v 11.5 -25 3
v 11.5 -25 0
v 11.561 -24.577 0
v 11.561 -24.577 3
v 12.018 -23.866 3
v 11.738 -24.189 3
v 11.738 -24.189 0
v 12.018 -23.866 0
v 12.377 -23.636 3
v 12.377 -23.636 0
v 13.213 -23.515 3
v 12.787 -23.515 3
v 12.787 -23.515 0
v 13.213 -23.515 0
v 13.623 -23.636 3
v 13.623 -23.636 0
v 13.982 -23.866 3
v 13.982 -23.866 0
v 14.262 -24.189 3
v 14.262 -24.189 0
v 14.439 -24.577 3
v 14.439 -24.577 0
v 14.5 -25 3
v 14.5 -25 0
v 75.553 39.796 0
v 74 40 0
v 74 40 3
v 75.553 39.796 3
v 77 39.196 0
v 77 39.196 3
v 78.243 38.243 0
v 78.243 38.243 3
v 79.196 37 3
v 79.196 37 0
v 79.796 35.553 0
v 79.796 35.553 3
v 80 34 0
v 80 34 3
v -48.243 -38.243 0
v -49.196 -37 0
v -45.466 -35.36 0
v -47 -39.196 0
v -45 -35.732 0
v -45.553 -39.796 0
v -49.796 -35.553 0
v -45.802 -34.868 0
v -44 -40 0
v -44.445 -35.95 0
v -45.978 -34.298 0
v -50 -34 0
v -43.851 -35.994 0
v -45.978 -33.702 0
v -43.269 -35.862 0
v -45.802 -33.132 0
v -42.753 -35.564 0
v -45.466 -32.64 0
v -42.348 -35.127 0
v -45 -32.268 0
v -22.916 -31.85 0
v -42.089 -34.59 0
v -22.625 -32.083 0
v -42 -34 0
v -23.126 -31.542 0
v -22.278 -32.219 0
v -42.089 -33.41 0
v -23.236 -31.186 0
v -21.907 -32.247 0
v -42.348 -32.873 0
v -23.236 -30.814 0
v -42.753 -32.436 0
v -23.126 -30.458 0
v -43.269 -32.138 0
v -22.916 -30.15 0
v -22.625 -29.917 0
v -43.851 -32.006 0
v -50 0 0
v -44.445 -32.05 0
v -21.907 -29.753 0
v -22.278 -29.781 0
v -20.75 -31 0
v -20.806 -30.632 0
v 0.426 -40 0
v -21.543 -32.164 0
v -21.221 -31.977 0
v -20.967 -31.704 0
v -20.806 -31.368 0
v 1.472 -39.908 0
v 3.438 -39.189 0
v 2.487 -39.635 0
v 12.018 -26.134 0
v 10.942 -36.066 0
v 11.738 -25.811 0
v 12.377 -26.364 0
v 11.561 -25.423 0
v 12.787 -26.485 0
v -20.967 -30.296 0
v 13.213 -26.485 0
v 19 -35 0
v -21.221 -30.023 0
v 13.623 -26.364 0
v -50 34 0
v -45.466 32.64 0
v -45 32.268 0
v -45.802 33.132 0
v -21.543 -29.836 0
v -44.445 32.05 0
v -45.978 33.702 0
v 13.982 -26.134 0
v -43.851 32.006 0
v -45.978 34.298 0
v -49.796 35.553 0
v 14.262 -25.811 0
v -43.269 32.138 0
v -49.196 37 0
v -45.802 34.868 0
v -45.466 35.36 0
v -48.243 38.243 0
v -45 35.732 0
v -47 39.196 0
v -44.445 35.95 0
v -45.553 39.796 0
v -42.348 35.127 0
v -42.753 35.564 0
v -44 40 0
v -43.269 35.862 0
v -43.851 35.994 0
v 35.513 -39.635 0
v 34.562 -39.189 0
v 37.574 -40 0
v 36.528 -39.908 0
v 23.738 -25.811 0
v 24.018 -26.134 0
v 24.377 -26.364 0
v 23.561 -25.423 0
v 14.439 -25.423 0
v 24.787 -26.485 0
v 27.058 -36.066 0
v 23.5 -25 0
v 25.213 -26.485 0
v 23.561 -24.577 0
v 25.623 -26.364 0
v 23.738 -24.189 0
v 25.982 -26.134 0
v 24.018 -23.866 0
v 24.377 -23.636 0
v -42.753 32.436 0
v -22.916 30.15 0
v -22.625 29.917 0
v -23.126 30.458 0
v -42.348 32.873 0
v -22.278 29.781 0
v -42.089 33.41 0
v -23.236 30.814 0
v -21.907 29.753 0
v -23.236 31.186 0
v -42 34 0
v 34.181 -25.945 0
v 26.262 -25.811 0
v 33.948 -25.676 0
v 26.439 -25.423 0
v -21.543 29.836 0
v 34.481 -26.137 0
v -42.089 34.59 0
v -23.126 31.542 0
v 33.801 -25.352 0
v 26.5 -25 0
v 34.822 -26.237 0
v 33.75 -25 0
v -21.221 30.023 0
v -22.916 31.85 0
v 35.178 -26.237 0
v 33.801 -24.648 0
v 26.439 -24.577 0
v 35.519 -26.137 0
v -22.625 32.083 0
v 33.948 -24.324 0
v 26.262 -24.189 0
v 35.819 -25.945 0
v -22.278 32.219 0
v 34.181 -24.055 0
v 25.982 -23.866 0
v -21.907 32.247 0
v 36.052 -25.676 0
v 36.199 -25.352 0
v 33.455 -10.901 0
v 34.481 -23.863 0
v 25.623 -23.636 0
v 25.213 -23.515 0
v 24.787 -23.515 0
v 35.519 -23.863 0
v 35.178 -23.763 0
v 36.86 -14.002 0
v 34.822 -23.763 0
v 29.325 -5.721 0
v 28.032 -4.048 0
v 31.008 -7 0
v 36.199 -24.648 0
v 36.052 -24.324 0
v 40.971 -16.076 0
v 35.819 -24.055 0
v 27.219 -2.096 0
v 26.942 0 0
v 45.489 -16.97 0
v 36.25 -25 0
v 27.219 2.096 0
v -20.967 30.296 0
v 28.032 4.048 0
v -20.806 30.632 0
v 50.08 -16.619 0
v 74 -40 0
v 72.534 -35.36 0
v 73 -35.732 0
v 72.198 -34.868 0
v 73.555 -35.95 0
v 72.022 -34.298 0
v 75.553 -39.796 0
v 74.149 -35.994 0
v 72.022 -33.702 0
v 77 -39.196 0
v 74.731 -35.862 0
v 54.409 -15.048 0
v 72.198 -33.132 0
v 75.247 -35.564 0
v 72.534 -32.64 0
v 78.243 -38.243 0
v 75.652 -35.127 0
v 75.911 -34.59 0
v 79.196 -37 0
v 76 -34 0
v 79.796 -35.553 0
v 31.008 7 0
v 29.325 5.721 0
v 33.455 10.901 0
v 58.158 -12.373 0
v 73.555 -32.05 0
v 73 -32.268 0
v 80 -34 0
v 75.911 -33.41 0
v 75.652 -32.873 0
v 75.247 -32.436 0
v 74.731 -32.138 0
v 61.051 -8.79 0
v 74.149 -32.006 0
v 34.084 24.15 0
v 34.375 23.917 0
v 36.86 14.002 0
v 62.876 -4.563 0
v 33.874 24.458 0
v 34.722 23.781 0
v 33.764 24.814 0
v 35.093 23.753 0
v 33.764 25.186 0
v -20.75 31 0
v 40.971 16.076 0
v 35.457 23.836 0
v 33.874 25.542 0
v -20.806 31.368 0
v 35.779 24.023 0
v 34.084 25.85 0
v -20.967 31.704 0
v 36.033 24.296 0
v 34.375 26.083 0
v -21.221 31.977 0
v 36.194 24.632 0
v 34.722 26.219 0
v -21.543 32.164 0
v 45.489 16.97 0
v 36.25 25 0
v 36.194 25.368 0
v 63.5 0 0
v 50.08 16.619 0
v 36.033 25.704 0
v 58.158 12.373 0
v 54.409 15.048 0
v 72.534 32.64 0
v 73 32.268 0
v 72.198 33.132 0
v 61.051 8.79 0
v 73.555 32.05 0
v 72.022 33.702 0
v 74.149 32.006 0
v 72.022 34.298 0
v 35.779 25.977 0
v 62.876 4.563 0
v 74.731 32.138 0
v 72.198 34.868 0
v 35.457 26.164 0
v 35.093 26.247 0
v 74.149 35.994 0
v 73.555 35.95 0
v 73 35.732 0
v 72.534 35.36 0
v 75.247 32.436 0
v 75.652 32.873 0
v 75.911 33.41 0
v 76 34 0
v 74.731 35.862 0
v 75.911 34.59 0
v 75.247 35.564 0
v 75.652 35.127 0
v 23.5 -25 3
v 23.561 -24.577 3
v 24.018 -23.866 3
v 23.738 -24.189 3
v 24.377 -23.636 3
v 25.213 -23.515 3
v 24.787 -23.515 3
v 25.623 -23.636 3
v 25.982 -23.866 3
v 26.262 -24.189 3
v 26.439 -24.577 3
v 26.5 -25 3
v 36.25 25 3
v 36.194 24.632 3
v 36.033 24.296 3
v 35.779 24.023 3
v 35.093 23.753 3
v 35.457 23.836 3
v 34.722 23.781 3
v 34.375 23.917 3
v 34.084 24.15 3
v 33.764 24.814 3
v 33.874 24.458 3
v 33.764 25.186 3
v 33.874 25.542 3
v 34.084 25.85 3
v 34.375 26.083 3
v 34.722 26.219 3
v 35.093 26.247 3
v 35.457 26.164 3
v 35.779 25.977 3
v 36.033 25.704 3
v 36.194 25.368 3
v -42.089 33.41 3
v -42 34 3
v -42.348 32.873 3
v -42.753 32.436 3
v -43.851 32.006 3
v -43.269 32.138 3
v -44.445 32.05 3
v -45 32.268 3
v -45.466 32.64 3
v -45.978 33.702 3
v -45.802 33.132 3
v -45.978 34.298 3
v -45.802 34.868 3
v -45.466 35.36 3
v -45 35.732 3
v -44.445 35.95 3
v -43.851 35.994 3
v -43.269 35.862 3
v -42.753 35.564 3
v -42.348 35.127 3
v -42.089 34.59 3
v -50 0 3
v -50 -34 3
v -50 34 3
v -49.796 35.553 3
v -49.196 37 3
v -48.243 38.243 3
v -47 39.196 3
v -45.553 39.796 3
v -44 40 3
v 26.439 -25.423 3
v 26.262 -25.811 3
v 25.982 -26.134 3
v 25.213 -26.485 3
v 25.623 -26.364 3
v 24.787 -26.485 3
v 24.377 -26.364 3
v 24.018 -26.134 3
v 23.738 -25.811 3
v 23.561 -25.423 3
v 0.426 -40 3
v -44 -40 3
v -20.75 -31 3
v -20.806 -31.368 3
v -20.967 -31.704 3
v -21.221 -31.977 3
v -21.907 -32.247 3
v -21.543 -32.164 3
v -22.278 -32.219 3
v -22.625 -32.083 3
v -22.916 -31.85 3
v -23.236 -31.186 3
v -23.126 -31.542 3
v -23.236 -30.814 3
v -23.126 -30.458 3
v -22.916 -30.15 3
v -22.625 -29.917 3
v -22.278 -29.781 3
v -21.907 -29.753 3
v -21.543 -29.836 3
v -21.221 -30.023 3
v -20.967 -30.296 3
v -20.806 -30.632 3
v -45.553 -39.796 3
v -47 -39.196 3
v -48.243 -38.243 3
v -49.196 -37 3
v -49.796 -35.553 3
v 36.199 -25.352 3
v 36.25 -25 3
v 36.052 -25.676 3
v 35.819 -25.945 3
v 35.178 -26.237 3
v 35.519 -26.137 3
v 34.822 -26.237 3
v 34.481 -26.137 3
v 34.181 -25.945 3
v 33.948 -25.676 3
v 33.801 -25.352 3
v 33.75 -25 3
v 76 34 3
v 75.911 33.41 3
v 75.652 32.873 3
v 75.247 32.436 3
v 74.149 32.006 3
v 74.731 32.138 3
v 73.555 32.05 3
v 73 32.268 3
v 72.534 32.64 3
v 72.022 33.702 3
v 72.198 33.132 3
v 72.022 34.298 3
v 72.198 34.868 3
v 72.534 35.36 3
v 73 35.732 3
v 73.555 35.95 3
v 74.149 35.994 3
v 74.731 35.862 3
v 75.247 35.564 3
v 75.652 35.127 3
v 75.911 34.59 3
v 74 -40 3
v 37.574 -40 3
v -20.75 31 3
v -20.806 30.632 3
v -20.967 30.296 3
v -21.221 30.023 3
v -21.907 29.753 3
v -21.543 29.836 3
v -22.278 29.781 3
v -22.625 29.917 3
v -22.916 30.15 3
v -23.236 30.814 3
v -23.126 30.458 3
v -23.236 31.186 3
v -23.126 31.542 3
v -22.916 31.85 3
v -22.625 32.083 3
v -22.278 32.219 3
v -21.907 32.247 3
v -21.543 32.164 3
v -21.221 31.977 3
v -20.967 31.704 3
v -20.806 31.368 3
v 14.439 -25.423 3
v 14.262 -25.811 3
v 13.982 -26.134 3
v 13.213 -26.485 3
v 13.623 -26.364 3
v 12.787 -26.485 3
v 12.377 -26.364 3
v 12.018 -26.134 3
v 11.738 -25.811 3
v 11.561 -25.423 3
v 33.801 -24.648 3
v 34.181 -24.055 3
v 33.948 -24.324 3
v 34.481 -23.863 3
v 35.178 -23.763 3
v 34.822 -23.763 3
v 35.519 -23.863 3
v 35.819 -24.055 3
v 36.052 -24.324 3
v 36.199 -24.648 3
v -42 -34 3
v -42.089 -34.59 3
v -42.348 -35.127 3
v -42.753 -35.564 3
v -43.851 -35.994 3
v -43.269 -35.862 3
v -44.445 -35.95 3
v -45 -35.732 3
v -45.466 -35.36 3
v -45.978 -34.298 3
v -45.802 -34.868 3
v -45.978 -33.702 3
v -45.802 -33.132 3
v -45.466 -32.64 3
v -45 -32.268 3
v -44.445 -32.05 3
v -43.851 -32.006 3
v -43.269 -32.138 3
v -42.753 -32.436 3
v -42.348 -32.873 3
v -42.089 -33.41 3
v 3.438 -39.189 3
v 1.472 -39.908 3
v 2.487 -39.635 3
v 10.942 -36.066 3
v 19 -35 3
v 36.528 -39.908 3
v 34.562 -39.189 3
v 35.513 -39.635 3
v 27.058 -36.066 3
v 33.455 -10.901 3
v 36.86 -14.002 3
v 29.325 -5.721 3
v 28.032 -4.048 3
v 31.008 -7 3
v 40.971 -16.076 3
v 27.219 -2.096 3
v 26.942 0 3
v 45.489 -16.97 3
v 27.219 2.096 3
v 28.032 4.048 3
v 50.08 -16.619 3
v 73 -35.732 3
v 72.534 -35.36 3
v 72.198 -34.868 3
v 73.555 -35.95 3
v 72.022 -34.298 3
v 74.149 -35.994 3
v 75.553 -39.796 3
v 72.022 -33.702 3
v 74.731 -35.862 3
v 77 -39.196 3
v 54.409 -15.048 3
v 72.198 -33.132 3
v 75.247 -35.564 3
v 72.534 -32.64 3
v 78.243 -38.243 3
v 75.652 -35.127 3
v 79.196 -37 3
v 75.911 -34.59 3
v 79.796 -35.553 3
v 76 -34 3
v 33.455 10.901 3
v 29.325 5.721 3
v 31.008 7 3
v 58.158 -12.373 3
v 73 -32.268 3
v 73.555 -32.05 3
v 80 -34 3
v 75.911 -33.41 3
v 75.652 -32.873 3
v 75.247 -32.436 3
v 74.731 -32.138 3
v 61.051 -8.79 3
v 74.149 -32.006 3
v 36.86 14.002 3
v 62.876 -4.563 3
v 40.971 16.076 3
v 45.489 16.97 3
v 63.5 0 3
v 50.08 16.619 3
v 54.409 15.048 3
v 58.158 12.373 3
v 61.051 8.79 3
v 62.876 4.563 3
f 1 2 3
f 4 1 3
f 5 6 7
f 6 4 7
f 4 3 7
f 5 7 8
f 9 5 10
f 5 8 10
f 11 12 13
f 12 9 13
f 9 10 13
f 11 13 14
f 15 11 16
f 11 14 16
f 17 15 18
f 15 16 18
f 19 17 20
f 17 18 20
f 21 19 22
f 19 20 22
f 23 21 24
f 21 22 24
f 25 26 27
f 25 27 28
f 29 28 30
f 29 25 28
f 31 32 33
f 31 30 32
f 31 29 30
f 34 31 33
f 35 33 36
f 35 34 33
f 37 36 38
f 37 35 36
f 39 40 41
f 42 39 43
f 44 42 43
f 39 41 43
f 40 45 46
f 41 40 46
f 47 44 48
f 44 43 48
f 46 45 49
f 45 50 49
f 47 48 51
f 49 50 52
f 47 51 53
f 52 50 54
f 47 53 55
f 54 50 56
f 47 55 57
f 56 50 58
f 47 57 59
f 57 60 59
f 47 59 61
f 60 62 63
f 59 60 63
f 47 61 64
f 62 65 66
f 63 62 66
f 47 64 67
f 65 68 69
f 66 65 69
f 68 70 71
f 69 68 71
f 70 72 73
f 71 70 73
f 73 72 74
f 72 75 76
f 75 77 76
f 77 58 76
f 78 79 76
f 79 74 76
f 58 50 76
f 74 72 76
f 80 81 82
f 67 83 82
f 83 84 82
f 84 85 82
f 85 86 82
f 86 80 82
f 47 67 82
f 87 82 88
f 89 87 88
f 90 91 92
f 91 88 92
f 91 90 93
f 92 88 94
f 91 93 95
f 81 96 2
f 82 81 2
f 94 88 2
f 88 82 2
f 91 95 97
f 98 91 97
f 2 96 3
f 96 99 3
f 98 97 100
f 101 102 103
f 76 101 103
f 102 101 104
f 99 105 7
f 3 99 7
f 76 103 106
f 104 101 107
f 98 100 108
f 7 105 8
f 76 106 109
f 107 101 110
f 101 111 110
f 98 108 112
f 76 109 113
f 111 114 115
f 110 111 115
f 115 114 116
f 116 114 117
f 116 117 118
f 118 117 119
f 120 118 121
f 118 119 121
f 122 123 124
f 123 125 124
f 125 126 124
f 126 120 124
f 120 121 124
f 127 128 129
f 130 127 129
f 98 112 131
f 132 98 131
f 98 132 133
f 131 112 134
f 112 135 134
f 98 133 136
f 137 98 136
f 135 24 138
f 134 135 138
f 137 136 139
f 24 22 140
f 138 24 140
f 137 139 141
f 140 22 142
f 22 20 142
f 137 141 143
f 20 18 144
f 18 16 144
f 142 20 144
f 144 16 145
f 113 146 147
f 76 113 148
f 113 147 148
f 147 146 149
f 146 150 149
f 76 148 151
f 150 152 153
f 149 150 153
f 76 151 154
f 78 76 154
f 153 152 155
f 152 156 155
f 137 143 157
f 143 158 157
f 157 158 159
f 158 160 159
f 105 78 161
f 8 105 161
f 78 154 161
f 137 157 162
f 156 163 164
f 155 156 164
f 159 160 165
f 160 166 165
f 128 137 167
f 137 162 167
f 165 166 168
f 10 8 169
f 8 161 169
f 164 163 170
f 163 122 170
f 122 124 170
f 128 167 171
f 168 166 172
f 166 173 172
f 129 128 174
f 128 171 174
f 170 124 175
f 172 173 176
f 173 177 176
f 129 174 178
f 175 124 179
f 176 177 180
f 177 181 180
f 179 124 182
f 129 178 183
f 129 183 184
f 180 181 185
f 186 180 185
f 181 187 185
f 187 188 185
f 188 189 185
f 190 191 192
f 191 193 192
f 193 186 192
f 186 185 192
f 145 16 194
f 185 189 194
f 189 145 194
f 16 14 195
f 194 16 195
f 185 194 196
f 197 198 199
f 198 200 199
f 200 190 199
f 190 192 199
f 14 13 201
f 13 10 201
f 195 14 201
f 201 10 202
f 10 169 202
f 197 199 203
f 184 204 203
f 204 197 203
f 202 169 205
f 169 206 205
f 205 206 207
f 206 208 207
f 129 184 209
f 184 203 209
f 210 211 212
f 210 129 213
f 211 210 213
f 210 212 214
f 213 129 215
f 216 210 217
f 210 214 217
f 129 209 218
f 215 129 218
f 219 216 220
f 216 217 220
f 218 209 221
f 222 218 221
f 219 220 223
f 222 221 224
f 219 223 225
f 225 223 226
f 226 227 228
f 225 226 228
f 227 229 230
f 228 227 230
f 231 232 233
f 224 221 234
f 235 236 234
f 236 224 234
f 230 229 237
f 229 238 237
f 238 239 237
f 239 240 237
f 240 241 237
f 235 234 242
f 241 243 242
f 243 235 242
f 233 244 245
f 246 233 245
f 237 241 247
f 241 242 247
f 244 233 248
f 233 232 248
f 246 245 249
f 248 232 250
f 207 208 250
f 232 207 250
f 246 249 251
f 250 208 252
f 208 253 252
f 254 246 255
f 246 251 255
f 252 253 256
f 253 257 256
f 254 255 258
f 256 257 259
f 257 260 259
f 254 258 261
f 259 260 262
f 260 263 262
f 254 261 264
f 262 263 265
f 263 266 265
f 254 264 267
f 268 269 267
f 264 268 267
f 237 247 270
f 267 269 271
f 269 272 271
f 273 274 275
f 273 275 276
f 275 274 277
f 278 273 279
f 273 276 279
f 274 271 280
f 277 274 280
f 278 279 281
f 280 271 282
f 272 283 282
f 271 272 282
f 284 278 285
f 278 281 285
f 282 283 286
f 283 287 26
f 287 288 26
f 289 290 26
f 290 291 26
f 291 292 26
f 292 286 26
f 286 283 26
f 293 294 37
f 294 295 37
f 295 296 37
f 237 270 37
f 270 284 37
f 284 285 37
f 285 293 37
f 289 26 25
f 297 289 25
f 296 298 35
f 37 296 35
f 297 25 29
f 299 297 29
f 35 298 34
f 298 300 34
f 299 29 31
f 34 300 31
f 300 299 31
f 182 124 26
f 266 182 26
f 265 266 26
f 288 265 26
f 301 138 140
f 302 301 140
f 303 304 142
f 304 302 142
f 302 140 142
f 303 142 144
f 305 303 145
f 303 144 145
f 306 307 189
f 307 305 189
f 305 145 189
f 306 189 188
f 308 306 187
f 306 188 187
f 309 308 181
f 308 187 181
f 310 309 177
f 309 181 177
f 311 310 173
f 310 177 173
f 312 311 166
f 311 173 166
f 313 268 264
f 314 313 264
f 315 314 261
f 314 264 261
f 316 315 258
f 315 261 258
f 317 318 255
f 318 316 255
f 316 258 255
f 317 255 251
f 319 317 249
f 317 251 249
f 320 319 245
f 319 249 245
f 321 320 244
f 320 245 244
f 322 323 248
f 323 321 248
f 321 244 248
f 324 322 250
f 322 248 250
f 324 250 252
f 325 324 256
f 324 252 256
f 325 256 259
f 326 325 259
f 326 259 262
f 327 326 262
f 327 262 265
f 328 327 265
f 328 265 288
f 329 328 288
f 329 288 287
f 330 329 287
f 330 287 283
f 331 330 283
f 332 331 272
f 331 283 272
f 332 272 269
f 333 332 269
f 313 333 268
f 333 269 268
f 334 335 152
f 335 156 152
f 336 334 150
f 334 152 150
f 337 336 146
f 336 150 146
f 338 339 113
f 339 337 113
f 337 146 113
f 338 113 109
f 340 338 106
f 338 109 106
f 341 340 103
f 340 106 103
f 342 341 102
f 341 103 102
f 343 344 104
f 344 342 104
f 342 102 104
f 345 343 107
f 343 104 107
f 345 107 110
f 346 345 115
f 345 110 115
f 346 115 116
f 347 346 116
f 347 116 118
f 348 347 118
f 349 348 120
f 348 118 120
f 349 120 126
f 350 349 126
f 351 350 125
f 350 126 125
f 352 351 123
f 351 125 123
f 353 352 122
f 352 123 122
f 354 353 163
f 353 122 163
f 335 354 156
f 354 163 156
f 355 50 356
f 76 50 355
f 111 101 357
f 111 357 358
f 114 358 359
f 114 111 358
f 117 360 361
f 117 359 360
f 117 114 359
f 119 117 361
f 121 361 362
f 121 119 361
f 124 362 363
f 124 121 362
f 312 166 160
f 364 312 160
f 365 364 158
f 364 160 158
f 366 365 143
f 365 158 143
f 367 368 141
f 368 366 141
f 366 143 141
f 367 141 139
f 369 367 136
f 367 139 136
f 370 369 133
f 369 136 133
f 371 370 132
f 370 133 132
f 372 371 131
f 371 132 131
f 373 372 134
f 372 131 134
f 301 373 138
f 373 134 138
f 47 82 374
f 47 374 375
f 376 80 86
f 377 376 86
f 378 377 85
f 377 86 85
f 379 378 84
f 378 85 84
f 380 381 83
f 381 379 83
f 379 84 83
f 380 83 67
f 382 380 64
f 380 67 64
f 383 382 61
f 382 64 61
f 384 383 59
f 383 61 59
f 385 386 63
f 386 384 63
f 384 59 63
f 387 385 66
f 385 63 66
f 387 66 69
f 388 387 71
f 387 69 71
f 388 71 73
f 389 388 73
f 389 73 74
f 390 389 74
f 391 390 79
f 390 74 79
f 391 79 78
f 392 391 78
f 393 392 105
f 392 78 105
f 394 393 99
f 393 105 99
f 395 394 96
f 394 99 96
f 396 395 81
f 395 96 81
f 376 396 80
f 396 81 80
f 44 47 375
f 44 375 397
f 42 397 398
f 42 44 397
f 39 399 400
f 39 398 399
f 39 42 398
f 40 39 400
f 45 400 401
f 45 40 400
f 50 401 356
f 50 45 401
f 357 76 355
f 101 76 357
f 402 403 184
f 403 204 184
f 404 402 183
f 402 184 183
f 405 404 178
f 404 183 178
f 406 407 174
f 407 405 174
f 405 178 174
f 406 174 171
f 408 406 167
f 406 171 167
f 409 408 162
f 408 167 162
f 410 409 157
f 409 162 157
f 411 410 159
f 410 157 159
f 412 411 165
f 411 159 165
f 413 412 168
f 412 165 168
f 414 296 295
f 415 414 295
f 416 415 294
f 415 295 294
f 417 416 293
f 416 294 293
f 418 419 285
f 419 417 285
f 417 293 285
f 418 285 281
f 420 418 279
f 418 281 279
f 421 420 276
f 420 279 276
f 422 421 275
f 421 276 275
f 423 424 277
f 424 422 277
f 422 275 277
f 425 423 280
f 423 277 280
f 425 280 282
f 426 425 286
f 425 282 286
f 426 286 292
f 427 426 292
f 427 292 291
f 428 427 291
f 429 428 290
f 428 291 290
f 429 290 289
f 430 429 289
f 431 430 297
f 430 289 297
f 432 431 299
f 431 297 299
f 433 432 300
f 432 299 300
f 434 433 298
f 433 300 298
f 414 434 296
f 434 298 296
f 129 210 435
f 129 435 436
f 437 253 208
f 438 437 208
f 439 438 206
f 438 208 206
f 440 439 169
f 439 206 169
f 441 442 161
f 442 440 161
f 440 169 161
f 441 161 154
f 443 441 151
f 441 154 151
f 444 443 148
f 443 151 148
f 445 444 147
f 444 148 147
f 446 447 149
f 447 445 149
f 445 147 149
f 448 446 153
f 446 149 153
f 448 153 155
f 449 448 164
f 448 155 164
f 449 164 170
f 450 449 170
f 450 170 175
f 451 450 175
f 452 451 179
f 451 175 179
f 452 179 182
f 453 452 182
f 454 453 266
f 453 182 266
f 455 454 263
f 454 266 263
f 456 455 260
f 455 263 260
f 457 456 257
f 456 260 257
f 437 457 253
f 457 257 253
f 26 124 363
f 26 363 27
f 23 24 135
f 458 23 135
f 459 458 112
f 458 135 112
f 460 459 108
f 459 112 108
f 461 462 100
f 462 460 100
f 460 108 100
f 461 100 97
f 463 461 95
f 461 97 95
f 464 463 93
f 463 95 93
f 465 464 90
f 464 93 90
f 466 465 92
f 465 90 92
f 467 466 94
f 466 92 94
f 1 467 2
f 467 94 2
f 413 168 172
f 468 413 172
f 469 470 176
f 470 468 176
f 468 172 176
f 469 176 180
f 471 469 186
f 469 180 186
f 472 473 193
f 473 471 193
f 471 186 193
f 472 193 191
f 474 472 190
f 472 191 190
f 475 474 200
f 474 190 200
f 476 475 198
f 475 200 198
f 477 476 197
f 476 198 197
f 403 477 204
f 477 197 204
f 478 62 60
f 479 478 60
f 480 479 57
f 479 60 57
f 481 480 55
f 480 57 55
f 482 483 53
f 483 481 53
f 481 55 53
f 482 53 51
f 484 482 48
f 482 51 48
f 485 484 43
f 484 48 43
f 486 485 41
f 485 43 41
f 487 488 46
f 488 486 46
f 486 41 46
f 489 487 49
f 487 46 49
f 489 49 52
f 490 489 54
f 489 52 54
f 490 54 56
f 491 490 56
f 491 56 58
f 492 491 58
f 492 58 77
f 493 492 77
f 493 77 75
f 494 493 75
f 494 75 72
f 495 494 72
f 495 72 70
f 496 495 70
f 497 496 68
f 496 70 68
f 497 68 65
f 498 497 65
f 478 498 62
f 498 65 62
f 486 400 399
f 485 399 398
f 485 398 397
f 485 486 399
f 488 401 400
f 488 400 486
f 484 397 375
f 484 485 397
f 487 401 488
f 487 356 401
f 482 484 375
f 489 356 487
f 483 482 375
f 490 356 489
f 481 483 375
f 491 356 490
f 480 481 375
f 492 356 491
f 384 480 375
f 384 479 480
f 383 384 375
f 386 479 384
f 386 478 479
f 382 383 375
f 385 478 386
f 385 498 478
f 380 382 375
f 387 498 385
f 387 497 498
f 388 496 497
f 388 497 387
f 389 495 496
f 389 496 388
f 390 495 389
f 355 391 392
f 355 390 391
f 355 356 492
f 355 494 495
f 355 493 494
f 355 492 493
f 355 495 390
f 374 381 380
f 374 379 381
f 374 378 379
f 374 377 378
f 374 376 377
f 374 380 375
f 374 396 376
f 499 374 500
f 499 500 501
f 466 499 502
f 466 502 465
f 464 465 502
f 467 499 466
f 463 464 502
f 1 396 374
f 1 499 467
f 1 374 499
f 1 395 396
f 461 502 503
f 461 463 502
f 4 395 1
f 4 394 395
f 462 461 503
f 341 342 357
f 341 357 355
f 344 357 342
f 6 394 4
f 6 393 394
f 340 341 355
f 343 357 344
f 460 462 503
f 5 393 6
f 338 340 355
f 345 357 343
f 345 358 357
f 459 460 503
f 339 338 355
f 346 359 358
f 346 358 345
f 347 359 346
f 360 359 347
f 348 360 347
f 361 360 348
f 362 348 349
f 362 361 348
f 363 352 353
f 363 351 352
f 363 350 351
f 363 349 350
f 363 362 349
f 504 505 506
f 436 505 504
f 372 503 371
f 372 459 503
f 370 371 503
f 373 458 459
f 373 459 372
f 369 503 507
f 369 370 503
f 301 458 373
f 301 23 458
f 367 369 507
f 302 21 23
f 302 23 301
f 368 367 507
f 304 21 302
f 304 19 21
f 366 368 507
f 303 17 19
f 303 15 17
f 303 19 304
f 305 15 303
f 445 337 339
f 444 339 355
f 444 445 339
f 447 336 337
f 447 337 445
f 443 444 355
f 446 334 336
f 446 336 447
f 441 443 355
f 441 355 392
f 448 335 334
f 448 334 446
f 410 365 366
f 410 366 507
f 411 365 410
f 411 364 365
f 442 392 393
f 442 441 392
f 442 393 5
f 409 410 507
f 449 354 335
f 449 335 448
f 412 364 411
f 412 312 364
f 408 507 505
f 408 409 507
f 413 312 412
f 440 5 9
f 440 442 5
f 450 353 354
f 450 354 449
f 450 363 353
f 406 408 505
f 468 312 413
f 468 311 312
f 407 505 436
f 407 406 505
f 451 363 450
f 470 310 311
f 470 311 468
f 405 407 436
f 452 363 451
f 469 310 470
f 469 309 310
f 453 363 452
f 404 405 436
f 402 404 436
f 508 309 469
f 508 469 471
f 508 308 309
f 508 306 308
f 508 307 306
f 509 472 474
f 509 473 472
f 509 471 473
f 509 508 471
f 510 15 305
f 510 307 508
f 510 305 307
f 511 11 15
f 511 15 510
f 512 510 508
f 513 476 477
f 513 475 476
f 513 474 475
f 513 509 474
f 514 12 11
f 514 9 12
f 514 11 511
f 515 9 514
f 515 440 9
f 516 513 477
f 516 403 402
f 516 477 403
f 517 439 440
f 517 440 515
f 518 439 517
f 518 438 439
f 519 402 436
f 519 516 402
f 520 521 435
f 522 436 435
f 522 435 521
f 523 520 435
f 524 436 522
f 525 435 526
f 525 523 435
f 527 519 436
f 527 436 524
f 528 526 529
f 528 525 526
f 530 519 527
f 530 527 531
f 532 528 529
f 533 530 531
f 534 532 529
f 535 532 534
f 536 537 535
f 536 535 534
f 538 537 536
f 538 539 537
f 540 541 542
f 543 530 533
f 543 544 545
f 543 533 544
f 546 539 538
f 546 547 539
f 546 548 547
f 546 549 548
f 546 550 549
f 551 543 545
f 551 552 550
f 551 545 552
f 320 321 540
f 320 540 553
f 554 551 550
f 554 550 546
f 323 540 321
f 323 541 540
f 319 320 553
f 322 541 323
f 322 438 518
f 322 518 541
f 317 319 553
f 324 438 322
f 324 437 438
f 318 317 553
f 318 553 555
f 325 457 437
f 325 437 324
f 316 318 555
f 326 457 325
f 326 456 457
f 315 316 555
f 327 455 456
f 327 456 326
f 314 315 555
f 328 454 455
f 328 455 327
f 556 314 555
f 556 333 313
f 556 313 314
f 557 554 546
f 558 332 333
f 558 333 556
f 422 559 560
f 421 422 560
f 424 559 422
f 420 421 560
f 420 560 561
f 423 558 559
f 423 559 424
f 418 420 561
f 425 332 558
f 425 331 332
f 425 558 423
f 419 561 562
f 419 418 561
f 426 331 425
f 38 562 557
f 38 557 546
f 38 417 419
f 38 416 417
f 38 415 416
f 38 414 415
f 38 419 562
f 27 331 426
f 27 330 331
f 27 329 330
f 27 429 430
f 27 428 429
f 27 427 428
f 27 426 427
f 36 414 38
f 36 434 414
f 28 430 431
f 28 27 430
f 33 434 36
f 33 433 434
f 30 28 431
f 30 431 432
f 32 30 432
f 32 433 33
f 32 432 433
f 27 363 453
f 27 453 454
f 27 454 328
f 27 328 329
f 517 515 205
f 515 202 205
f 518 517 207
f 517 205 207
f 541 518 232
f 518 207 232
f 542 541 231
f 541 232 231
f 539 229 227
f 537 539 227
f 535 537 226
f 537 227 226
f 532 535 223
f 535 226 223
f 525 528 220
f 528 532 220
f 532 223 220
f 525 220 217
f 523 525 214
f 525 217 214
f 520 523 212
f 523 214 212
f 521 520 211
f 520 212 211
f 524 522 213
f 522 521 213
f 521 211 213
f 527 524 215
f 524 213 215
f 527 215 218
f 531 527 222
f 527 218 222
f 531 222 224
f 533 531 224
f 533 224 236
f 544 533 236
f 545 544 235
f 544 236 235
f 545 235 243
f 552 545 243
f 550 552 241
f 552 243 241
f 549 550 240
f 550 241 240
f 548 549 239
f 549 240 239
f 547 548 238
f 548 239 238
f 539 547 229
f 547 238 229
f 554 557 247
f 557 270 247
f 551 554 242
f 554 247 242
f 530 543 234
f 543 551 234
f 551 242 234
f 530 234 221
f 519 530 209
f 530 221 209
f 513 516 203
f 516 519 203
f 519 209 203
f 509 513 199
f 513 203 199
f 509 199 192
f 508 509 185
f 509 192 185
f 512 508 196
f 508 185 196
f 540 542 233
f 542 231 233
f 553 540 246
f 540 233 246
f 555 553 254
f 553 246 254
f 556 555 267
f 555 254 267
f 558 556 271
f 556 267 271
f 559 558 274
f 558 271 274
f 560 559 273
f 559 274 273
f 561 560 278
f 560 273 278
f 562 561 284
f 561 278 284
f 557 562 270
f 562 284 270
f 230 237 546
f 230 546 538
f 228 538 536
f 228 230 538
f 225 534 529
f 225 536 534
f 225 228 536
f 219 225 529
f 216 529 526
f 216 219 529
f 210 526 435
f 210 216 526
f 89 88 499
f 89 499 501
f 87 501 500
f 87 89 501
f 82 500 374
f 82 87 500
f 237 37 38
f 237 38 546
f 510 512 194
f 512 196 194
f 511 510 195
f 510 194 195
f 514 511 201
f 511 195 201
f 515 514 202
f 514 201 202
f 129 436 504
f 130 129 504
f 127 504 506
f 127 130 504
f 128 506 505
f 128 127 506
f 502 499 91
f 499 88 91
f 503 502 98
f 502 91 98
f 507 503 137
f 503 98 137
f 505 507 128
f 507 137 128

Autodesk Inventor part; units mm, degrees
ref_plane "YZ Plane" through (0, 0, 0) normal (1, 0, 0) x (0, 1, 0)
ref_plane "XZ Plane" through (0, 0, 0) normal (0, 1, 0) x (-1, 0, 0)
ref_plane "XY Plane" through (0, 0, 0) normal (0, 0, 1) x (1, 0, 0)
sketch "Эскиз1" plane through (0, 0, 0) normal (0, 0, 1) x (1, 0, 0)
  line L0 (-63, 0) -> (70, 0)
  line L1 (0, 29) -> (0, -30)
  circle A0 centre (35, 25) radius 1.25
  circle A1 centre (-22, 31) radius 1.25
  circle A2 centre (-22, -31) radius 1.25
  circle A3 centre (35, -25) radius 1.25
  arc A4 (31.0081, -7) -> (31.0081, 7) centre (46.5, 0) ccw
  line L2 (35, -25) -> (0, -25)
  circle A5 centre (25, -25) radius 1.5
  circle A6 centre (13, -25) radius 1.5
  arc A7 (31.0081, 7) -> (31.0081, -7) centre (35, 0) ccw
  line L3 (-44, 40) -> (74, 40)
  line L4 (80, 34) -> (80, -34)
  line L5 (-50, -34) -> (-50, 34)
  arc A8 (-44, 40) -> (-50, 34) centre (-44, 34) ccw
  arc A9 (-50, -34) -> (-44, -40) centre (-44, -34) ccw
  arc A10 (74, -40) -> (80, -34) centre (74, -34) ccw
  arc A11 (80, 34) -> (74, 40) centre (74, 34) ccw
  circle A12 centre (-44, 34) radius 2
  circle A13 centre (-44, -34) radius 2
  circle A14 centre (74, -34) radius 2
  circle A15 centre (74, 34) radius 2
  arc A16 (34.5621, -39.1892) -> (3.4379, -39.1892) centre (19, -66) ccw
  line L6 (74, -40) -> (37.5742, -40)
  line L7 (0.4258, -40) -> (-44, -40)
  arc A17 (0.4258, -40) -> (3.4379, -39.1892) centre (0.4258, -34) ccw
  arc A18 (34.5621, -39.1892) -> (37.5742, -40) centre (37.5742, -34) ccw
  point P0 (0, 0)
  point P1 (-50, 40)
  point P2 (80, 40)
  point P3 (80, -40)
  point P4 (-50, -40)
  point P5 (2.1181, -40)
  point P6 (35.8819, -40)
  dimension "d3" = 2.5
  dimension "d4" = 2.5
  dimension "d5" = 2.5
  dimension "d6" = 2.5
  dimension "d9" = 62
  dimension "d10" = 50
  dimension "d11" = 34
  dimension "d12" = 3
  dimension "d14" = 10
  dimension "d16" = 3
  dimension "d17" = 12
  dimension "d19" = 46.5
  dimension "d20" = 130
  dimension "d21" = 80
  dimension "d22" = 130
  dimension "d23" = 6
  dimension "d24" = 4
  dimension "d25" = 4
  dimension "d26" = 4
  dimension "d27" = 4
  dimension "d31" = 6
extrude "Выдавливание1" add sketch "Эскиз1" along normal blind 3
properties part number "06-01-Платформа для лидара"
